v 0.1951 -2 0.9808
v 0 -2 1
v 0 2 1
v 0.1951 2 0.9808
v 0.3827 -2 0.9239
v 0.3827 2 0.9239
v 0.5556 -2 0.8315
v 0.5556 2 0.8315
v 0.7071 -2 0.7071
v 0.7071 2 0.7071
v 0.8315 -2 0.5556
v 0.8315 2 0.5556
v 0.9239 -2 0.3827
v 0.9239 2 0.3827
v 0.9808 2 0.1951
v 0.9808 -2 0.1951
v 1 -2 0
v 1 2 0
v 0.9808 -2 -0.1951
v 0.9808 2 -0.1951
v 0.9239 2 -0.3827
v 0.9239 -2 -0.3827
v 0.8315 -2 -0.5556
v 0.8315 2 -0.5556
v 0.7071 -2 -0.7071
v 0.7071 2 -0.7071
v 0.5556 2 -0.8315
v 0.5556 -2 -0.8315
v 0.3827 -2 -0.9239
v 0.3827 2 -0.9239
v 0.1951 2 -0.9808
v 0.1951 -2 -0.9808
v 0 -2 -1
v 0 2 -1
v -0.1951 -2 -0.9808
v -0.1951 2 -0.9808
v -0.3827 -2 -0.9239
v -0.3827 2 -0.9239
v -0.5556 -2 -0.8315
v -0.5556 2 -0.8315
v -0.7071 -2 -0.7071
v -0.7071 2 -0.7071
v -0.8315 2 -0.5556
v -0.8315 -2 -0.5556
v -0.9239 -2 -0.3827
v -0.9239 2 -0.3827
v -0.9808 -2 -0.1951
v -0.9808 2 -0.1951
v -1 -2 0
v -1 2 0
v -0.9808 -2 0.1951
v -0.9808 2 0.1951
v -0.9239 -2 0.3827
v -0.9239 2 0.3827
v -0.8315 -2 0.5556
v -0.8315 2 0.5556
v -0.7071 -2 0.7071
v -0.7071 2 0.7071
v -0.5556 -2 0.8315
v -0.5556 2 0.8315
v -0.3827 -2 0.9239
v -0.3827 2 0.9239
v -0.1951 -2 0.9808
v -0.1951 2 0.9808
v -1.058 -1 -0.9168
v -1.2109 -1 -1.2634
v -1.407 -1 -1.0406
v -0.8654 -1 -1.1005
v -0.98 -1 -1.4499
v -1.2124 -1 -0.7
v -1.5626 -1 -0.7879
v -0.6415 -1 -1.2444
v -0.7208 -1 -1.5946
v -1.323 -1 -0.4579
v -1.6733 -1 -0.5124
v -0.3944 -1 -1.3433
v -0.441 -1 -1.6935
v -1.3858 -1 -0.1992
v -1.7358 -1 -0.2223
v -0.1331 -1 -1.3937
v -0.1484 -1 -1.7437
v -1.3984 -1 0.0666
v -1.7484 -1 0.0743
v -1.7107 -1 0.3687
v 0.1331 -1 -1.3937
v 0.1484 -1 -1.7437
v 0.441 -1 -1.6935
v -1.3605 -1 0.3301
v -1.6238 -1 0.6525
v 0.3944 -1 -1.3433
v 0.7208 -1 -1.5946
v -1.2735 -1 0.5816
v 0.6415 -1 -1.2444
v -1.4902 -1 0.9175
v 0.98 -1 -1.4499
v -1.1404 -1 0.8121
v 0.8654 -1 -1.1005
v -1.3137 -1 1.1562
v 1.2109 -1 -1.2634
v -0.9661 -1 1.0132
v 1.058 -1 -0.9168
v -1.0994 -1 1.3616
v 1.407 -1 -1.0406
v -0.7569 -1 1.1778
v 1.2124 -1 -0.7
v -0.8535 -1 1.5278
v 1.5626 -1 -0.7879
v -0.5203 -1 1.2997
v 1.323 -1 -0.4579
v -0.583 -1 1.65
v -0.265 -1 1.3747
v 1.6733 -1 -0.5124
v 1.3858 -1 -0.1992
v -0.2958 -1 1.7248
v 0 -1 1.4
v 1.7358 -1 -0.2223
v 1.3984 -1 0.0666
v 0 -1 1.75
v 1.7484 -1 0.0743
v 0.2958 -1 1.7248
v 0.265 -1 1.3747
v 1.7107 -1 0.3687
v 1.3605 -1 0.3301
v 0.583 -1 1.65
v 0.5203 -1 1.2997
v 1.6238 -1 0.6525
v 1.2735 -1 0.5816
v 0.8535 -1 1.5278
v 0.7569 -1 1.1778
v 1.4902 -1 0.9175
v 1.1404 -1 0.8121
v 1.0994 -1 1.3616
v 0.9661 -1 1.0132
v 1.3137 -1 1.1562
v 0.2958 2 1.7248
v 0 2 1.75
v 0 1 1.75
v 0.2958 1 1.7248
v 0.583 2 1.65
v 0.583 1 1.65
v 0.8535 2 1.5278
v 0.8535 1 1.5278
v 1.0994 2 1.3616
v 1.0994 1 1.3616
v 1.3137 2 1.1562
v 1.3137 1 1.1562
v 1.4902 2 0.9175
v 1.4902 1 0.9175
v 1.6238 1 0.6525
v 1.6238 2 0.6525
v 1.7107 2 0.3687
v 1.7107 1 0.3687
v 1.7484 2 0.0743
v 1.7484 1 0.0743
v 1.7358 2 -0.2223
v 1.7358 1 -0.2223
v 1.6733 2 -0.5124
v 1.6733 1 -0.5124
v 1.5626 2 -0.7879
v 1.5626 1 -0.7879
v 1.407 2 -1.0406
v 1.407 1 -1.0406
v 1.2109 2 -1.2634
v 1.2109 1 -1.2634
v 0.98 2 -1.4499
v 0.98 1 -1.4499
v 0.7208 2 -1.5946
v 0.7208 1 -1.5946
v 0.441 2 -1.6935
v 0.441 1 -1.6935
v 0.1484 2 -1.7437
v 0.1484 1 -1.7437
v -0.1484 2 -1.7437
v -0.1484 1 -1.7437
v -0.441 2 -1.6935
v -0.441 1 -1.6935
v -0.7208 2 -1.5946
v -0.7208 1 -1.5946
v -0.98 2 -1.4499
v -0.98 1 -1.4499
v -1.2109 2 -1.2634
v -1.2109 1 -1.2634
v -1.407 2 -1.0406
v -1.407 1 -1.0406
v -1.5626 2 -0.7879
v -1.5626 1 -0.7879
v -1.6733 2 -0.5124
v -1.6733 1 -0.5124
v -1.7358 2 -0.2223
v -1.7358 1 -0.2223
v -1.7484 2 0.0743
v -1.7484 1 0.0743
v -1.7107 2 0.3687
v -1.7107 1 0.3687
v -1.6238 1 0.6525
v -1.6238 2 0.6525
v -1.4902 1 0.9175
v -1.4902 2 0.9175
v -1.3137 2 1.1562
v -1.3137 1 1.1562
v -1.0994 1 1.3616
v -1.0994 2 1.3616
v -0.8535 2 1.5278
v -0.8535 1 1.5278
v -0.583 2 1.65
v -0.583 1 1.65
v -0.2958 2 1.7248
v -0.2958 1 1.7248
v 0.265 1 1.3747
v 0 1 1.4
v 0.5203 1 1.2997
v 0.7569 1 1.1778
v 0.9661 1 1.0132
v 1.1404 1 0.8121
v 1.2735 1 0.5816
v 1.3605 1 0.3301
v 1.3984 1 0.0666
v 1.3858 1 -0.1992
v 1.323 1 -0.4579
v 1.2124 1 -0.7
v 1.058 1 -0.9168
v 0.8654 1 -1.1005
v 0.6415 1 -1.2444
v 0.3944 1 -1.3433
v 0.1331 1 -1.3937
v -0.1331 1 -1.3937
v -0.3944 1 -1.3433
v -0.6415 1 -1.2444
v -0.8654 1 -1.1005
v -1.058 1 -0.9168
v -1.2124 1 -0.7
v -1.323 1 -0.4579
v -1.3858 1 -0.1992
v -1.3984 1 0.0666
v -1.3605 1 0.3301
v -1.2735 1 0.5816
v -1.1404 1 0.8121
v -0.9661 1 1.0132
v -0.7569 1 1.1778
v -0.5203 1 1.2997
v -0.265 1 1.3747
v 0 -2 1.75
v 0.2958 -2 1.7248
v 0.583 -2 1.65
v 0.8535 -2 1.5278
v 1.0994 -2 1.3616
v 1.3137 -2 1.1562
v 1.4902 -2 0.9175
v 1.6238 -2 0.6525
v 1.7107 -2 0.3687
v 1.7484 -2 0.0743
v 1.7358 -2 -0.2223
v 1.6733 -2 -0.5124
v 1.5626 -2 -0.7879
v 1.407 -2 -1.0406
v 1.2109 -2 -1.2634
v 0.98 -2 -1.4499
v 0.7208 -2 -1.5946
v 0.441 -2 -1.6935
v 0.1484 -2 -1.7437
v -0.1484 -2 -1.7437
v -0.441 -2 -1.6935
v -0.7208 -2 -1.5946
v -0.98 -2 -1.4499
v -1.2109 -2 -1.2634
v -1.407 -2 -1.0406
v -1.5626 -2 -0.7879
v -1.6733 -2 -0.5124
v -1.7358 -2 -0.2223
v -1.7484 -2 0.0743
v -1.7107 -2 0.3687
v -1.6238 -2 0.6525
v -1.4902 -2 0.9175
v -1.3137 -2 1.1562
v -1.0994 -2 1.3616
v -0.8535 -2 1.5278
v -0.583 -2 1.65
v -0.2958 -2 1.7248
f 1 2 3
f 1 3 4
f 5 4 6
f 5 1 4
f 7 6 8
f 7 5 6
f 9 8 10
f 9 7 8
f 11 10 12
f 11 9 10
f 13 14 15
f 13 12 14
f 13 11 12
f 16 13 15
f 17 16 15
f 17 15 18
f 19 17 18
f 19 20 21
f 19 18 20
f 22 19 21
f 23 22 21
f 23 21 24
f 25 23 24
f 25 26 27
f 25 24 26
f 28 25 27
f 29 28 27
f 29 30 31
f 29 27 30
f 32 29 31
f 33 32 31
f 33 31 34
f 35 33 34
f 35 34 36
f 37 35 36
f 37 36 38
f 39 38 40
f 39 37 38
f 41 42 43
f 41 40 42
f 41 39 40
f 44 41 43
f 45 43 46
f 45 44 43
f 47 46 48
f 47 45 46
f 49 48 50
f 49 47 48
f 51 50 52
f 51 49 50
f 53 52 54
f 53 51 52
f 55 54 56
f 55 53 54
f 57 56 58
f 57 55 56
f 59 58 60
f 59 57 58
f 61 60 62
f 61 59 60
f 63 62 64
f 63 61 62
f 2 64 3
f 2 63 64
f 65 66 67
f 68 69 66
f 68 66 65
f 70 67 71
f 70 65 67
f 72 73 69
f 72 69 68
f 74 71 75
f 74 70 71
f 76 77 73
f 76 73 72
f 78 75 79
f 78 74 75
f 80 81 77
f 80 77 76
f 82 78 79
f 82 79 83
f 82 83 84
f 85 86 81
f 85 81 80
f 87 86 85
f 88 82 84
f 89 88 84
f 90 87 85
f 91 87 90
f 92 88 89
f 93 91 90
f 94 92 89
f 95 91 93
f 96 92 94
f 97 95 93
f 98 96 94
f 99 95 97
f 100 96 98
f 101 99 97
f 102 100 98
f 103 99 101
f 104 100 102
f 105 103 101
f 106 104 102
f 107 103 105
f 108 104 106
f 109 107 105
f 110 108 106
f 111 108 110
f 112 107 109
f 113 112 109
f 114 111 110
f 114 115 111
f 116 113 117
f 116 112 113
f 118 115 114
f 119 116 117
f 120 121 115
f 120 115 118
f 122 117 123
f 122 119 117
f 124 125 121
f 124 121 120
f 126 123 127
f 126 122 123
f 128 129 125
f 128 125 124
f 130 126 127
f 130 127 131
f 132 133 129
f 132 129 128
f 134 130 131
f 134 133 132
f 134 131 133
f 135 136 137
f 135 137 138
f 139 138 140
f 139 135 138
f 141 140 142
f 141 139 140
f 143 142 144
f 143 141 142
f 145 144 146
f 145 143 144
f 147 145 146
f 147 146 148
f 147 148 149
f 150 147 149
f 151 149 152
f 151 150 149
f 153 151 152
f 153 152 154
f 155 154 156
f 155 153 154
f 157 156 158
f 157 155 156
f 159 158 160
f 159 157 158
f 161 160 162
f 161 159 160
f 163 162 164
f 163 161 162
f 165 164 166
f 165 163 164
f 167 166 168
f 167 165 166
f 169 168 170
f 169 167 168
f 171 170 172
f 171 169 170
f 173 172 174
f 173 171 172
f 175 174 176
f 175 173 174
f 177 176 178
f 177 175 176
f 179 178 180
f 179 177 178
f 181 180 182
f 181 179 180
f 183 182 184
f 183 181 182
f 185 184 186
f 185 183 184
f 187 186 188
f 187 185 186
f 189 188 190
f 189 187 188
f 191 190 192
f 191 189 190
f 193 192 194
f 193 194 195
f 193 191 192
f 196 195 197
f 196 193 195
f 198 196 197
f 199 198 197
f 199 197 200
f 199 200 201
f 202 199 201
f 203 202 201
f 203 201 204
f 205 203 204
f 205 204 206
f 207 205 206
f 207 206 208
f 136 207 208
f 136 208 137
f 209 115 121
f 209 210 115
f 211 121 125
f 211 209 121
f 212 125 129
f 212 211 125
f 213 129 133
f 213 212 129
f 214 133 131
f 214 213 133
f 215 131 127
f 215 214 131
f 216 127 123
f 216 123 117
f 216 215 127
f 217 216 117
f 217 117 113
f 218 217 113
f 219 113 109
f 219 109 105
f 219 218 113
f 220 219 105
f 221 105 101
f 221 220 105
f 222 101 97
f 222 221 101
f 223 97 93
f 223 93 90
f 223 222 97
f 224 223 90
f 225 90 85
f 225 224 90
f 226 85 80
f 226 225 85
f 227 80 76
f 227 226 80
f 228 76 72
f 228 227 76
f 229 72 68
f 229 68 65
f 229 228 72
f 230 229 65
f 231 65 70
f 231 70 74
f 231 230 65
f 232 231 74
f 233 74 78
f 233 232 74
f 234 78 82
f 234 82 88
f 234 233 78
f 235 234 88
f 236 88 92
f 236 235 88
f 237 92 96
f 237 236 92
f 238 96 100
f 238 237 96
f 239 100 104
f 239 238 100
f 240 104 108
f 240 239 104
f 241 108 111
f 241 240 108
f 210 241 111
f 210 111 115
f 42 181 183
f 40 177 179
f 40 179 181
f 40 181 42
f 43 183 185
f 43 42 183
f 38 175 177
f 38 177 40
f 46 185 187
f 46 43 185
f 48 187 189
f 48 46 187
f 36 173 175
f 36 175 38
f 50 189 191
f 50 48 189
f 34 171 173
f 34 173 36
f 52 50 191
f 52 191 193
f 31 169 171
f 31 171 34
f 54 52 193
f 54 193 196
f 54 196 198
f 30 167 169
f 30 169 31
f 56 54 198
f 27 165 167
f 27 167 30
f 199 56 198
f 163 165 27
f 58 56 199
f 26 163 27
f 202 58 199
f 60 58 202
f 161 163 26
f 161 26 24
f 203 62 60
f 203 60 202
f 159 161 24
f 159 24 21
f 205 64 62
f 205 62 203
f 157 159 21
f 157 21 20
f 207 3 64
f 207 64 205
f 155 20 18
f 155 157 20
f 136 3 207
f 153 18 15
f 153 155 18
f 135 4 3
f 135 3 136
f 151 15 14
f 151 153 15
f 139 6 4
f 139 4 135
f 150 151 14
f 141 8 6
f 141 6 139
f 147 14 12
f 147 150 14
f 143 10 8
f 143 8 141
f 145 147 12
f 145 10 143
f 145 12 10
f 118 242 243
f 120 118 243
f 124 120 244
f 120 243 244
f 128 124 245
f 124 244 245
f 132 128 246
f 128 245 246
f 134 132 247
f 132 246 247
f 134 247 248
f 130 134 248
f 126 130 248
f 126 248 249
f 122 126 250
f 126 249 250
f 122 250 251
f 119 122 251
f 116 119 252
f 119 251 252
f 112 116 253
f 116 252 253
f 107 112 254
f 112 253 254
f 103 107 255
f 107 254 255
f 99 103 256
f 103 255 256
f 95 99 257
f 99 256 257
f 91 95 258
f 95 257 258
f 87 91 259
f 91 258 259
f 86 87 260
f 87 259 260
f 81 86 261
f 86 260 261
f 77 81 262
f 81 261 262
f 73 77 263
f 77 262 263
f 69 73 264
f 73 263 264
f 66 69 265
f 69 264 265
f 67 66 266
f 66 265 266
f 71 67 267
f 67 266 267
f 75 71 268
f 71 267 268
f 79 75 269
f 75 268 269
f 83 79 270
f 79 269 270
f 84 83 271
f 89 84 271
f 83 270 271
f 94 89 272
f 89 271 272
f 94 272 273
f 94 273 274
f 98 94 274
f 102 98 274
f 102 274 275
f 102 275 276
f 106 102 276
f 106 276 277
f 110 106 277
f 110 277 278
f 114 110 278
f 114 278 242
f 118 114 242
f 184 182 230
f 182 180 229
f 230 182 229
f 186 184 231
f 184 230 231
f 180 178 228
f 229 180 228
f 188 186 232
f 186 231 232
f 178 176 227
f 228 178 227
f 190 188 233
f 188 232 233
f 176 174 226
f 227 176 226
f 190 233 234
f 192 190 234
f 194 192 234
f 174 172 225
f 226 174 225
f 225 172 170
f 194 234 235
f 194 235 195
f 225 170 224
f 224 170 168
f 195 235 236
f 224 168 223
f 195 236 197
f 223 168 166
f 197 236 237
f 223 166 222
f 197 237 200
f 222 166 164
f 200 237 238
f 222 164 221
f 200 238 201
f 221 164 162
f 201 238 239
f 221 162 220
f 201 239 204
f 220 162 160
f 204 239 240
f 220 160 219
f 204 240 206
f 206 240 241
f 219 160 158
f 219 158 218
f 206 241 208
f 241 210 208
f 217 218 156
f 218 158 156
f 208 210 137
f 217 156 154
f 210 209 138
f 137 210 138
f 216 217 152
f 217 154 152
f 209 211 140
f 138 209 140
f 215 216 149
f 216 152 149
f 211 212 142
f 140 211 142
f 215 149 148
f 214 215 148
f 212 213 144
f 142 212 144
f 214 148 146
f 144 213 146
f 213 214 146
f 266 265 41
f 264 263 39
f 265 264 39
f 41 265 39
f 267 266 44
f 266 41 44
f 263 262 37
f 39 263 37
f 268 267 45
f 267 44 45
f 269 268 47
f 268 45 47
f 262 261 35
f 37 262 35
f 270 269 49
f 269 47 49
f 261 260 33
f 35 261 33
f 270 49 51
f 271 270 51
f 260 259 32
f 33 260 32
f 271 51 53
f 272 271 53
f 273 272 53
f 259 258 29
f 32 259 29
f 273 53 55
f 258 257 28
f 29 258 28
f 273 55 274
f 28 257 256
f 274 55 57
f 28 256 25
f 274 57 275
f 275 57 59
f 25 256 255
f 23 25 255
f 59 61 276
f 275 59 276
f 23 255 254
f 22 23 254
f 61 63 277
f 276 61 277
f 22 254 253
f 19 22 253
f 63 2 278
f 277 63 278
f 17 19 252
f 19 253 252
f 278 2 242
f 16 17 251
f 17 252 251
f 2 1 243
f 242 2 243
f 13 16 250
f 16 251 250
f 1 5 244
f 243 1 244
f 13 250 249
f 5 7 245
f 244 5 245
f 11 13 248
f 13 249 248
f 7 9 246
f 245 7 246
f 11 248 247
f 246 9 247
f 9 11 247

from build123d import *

# Parameters (mm, degrees)
SKETCH1_R               = 1.4
BOSS_EXTRUDE1_DEPTH     = 2
SKETCH2_R               = 1.75
BOSS_EXTRUDE2_DEPTH     = 1
CUT_EXTRUDE1_DEPTH      = 4.181980515
CUT_EXTRUDE1_DEPTH_BACK = 4.181980515
SKETCH3_R               = 1


with BuildPart() as part:
    # Sketch1 → Boss-Extrude1 (new, symmetric)
    with BuildSketch(Plane(origin=(0, 0, 0), x_dir=(1, 0, 0), z_dir=(0, 1, 0))):
        with Locations(Location((0, 0, 0), (0, 0, 270))):
            Circle(SKETCH1_R)
    extrude(amount=BOSS_EXTRUDE1_DEPTH, both=True)

    # Sketch2 → Boss-Extrude2 (add)
    with BuildSketch(Plane(origin=(0, 2, 0), x_dir=(1, 0, 0), z_dir=(0, 1, 0))):
        with Locations(Location((0, 0, 0), (0, 0, 270))):
            Circle(SKETCH2_R)
    boss_extrude2 = extrude(amount=-BOSS_EXTRUDE2_DEPTH)

    # Mirror1: Boss-Extrude2 across plane
    add(boss_extrude2.mirror(Plane.ZX))

    # Sketch3 → Cut-Extrude1 (cut, two sides: drawn at the far end of the back side and taken through both)
    with BuildSketch(Plane(origin=(0, 0, 0), x_dir=(1, 0, 0), z_dir=(0, 1, 0)).offset(-CUT_EXTRUDE1_DEPTH_BACK)):
        with Locations(Location((0, 0, 0), (0, 0, 270))):
            Circle(SKETCH3_R)
    extrude(amount=CUT_EXTRUDE1_DEPTH + CUT_EXTRUDE1_DEPTH_BACK, mode=Mode.SUBTRACT)


solid = part.part
